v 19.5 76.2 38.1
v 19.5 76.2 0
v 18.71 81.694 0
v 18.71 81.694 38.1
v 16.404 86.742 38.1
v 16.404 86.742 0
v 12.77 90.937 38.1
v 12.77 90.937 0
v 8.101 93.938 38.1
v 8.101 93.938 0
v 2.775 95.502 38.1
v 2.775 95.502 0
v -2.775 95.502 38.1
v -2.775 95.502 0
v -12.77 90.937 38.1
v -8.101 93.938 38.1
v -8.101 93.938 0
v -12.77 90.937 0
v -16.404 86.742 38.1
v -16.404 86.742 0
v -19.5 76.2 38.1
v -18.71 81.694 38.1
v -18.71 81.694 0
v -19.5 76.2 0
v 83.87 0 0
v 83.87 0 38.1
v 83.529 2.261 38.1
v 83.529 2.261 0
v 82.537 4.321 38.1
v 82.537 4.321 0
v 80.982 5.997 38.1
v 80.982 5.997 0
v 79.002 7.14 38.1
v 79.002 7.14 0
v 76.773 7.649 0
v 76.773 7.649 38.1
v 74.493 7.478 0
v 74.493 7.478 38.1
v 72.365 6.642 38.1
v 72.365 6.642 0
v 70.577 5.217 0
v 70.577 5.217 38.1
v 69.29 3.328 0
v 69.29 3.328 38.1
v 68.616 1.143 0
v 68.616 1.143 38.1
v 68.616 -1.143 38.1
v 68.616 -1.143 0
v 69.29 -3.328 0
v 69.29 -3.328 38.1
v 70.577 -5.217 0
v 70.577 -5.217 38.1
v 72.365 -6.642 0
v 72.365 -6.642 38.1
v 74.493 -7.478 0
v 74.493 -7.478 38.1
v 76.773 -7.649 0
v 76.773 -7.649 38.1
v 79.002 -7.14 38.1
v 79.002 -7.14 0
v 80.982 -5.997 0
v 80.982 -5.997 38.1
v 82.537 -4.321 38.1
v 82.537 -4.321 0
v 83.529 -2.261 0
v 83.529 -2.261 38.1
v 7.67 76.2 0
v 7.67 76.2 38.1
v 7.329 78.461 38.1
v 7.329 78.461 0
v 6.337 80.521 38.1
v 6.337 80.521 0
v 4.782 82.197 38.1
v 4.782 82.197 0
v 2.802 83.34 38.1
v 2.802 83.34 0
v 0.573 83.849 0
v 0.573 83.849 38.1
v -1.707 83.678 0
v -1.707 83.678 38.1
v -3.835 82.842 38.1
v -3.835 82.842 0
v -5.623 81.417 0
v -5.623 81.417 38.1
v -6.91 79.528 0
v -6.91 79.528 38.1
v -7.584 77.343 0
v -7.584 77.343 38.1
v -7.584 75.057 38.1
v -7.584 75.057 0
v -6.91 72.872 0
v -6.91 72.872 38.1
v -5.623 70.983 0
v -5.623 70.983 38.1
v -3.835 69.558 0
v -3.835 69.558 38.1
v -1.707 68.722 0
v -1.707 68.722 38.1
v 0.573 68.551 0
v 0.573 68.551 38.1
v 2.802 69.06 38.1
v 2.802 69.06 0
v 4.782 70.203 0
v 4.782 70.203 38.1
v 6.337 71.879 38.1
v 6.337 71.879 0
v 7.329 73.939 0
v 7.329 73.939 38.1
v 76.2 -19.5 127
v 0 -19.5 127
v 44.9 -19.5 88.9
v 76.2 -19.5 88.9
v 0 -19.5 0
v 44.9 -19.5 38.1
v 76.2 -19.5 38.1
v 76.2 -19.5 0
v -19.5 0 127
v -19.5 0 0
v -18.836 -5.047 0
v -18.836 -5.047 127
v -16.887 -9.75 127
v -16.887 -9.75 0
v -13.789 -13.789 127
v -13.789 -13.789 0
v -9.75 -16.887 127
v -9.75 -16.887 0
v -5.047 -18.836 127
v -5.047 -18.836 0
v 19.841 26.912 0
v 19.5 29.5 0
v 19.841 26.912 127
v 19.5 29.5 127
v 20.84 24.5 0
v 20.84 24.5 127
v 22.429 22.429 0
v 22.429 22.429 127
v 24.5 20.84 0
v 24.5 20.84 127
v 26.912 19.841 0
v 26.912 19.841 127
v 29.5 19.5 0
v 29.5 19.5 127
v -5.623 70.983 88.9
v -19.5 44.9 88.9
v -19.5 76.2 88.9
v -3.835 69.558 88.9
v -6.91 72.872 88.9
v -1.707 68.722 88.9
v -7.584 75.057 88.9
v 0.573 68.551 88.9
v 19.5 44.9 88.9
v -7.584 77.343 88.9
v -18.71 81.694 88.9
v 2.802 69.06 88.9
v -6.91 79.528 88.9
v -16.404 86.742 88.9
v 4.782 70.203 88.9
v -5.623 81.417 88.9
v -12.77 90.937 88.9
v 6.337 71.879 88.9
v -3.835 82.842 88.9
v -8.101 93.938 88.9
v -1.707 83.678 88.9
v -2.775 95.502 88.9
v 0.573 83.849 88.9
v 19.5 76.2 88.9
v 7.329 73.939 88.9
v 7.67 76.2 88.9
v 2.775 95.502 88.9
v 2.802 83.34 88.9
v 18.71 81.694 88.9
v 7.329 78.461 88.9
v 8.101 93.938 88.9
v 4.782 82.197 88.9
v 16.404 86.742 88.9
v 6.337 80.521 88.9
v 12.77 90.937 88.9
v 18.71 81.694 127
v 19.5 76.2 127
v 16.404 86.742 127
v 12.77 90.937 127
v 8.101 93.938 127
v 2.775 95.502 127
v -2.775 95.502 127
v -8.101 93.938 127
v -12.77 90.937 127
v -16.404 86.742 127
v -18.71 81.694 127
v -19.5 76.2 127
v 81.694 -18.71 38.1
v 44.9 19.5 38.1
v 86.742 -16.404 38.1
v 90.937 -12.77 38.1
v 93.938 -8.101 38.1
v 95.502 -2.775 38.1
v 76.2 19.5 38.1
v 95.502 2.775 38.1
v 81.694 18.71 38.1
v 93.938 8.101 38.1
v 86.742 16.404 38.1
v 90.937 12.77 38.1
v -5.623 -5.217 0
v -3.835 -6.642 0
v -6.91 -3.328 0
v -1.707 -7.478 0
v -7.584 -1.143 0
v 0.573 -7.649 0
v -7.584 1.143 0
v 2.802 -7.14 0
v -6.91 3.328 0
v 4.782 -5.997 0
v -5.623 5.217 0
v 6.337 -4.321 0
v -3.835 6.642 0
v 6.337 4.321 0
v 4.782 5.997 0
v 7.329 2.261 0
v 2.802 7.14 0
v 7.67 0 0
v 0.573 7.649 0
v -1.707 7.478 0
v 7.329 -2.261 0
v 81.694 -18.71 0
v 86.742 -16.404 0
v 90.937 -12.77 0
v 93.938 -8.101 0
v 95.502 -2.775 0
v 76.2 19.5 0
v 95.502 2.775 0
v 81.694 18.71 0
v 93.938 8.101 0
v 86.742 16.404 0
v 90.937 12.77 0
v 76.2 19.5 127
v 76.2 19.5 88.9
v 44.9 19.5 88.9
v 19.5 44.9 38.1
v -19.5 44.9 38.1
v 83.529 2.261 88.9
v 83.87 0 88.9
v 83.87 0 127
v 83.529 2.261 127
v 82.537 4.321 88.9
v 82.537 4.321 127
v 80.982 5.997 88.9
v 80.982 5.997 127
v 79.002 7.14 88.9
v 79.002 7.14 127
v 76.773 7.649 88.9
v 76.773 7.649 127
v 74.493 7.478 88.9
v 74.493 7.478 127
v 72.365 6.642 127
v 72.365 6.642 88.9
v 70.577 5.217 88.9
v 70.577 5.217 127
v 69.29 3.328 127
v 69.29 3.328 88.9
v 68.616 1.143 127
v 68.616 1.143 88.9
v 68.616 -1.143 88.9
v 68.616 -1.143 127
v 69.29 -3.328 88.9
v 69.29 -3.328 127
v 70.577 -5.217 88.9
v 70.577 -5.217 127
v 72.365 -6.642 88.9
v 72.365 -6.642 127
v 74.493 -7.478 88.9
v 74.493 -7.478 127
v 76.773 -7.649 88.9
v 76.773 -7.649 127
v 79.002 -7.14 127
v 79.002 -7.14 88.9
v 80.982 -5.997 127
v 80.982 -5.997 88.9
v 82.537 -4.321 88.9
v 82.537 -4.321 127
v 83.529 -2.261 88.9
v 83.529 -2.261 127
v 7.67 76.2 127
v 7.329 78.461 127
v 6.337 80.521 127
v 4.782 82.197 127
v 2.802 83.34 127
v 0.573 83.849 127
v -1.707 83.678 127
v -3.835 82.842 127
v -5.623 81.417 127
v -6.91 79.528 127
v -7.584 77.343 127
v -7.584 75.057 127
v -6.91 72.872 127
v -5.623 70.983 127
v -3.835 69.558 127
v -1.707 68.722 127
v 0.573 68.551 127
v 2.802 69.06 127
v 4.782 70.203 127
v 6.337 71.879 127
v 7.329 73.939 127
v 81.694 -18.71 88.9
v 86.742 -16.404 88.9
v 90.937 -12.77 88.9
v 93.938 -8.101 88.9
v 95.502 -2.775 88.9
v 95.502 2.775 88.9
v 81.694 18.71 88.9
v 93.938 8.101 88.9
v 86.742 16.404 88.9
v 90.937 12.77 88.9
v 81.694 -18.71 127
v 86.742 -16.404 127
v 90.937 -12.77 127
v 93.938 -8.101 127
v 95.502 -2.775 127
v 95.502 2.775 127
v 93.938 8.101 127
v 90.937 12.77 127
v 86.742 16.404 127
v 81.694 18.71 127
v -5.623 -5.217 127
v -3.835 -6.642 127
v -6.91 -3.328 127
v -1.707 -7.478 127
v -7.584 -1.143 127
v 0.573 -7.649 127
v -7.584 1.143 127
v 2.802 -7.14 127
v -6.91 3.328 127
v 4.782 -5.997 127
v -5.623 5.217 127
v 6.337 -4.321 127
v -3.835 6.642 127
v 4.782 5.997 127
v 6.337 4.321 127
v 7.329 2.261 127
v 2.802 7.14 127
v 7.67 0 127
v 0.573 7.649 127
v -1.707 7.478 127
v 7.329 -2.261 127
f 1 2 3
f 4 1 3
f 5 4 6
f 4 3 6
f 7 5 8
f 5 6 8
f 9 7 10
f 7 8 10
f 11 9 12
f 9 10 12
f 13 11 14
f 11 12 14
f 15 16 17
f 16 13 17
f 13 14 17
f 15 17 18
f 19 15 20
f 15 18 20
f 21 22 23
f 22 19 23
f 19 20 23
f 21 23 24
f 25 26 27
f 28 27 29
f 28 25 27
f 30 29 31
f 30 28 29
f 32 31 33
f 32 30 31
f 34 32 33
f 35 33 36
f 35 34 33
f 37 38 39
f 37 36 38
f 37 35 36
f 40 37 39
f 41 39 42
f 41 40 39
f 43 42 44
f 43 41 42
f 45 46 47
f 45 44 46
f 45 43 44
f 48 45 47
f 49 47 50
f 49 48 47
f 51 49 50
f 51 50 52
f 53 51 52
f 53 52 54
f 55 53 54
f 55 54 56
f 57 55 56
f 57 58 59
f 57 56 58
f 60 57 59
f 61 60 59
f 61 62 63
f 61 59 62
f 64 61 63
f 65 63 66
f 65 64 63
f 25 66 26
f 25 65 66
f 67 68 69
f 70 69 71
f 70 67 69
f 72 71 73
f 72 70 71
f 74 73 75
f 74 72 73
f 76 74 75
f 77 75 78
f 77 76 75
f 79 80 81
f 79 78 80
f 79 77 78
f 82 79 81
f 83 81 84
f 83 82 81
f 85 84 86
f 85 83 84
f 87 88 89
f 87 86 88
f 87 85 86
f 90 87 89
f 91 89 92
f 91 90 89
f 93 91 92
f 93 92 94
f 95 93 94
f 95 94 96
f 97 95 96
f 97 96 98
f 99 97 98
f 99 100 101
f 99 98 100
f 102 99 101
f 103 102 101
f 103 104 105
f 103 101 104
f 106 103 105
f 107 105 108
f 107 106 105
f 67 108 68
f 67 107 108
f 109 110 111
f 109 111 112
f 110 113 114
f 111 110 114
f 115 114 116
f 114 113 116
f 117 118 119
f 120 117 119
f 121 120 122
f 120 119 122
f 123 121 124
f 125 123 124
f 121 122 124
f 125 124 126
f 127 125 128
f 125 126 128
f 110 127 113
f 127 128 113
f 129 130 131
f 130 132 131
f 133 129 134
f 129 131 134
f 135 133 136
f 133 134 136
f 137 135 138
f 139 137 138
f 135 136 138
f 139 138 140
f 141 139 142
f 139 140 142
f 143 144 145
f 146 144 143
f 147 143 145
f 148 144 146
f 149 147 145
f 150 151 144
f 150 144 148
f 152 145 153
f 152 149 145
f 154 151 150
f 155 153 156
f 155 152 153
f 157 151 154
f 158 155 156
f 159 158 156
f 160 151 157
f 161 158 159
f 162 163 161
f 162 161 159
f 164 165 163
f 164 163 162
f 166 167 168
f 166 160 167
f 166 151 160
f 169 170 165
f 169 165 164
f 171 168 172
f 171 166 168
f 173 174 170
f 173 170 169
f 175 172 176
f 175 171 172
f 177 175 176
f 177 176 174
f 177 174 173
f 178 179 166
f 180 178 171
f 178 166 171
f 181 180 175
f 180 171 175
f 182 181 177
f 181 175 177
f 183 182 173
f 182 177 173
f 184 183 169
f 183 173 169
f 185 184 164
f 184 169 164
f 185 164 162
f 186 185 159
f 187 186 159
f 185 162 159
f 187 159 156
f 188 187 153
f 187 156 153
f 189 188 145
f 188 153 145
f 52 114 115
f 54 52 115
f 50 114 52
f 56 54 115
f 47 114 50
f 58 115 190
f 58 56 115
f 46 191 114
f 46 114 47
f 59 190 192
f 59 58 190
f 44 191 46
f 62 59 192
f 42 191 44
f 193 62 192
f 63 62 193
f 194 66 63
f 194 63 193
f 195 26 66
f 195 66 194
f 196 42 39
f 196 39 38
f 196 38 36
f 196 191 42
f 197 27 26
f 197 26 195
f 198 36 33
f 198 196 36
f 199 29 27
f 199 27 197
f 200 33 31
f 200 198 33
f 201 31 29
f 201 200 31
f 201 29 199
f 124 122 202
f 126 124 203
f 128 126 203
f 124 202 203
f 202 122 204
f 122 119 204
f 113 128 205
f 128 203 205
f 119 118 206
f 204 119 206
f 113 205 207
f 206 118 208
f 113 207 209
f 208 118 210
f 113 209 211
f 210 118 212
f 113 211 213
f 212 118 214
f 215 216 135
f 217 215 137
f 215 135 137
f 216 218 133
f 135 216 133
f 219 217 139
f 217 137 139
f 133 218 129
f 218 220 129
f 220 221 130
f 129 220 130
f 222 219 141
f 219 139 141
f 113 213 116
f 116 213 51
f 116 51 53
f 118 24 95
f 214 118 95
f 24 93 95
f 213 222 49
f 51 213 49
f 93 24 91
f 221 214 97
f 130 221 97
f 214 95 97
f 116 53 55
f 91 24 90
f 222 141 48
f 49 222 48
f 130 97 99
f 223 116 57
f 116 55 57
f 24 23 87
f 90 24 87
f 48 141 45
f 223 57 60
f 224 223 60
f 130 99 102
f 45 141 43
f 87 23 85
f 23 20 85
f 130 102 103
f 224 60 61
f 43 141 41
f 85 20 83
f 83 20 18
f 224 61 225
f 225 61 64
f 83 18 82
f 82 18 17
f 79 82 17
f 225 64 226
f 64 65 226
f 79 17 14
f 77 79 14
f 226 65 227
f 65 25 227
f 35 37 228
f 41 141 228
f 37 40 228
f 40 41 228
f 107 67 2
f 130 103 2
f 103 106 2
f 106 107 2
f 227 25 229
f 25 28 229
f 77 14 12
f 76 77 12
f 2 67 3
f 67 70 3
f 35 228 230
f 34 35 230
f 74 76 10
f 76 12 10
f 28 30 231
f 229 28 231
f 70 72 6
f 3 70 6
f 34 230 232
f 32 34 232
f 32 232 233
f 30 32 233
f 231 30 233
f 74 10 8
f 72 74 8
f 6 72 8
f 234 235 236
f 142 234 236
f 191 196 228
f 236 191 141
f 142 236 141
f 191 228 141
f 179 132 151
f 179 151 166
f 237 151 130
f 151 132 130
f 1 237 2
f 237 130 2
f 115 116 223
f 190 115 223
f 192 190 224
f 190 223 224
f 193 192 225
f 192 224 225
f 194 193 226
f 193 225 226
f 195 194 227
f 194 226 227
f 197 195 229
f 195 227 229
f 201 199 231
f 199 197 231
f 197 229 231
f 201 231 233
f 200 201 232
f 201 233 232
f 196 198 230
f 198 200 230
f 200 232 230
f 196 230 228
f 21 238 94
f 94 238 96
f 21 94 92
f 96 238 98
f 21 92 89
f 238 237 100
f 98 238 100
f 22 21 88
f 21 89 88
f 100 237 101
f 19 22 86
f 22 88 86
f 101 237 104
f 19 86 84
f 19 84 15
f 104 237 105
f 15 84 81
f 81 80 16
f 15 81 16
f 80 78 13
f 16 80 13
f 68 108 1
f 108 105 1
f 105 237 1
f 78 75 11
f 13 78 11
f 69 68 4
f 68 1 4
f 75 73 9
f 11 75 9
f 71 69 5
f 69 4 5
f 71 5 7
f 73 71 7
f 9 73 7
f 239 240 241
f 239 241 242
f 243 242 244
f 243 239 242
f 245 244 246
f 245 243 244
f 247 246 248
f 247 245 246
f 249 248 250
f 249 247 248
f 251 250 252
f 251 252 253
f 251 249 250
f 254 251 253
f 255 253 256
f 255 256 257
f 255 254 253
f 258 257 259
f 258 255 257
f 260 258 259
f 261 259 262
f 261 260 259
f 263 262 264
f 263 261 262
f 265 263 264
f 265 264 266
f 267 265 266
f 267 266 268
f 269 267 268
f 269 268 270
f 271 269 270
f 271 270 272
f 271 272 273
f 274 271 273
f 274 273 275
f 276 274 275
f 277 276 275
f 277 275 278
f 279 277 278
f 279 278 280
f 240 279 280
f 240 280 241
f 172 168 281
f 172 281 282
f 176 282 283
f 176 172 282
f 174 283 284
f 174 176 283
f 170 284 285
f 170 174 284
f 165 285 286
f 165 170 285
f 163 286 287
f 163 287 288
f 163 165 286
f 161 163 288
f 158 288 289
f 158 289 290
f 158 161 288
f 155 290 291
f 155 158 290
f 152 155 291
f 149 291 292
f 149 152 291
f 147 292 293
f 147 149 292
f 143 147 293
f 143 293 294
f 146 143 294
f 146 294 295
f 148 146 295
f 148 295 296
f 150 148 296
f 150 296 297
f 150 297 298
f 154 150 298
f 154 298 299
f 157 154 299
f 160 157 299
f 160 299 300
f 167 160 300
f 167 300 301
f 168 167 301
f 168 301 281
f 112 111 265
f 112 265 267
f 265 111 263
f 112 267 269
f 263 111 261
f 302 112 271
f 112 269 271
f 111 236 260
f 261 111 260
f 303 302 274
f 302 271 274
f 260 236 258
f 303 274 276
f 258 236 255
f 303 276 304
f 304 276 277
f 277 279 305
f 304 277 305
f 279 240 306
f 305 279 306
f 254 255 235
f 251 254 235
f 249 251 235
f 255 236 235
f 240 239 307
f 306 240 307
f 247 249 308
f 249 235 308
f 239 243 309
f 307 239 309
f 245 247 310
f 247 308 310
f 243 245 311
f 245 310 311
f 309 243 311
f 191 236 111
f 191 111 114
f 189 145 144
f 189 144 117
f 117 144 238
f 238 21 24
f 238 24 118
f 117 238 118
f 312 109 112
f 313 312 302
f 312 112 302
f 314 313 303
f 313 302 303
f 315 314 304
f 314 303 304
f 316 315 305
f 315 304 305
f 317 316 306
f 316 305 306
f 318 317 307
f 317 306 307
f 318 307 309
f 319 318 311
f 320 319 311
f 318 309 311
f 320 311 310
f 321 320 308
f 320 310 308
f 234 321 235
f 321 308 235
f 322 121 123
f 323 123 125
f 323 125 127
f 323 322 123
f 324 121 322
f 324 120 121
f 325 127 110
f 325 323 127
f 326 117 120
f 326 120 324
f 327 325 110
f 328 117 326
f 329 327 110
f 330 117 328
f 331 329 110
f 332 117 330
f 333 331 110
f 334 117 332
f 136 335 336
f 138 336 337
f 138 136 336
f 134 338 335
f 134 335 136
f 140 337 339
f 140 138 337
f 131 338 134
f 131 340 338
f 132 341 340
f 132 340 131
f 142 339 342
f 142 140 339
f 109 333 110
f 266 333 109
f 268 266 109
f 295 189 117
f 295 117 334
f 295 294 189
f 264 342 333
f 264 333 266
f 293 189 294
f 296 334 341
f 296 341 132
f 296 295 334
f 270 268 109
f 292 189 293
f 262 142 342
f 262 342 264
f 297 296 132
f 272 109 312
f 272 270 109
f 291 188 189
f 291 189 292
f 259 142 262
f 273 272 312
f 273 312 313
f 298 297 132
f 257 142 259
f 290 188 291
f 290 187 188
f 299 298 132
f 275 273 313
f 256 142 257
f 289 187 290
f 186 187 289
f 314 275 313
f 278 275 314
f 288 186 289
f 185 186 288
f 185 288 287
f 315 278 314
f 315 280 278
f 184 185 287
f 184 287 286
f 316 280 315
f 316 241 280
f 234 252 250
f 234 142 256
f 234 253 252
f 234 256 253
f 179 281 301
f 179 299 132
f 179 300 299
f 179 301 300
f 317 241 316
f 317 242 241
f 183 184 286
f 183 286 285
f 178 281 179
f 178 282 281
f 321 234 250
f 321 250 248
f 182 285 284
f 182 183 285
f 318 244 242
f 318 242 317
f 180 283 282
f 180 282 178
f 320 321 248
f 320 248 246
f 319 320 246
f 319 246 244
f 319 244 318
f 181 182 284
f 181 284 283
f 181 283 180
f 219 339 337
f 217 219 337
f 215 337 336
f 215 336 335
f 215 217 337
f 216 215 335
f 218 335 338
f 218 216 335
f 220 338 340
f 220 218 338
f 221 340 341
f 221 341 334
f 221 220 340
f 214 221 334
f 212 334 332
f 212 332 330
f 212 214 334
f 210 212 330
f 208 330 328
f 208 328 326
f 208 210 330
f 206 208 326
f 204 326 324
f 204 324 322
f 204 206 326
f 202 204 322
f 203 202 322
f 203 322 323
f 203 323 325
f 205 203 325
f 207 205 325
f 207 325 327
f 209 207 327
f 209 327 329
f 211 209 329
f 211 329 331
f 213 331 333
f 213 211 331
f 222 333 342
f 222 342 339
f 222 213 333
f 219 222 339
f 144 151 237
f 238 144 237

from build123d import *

# Parameters (mm, degrees)
SKETCH1_R           = 7.67
BOSS_EXTRUDE1_DEPTH = 127
FILLET1_R           = 10
SKETCH2_W           = 50.8
SKETCH2_H           = 70.745219222
CUT_EXTRUDE1_DEPTH  = 186.59628229


with BuildPart() as part:
    # Sketch1 → Boss-Extrude1 (new body)
    with BuildSketch(Plane.XY):
        with BuildLine():
            Line((-19.5, 76.2), (-19.5, 0))
            ThreePointArc((-19.5, 0), (-13.788582233, -13.788582233), (0, -19.5))
            Line((0, -19.5), (76.2, -19.5))
            ThreePointArc((76.2, -19.5), (95.7, 0), (76.2, 19.5))
            Line((76.2, 19.5), (19.5, 19.5))
            Line((19.5, 19.5), (19.5, 76.2))
            ThreePointArc((19.5, 76.2), (0, 95.7), (-19.5, 76.2))
        make_face()
        Circle(SKETCH1_R, mode=Mode.SUBTRACT)
        with Locations((0, 76.2)):
            Circle(SKETCH1_R, mode=Mode.SUBTRACT)
        with Locations((76.2, 0)):
            Circle(SKETCH1_R, mode=Mode.SUBTRACT)
    extrude(amount=BOSS_EXTRUDE1_DEPTH)

    # Fillet1
    fillet1_edges = [part.edges().sort_by_distance(p)[0] for p in [
        (19.5, 19.5, 63.5),
    ]]
    fillet(fillet1_edges, radius=FILLET1_R)

    # Sketch2 → Cut-Extrude1 (cut, symmetric)
    with BuildSketch(Plane(origin=(0, 0, 0), x_dir=(0, 0, -1), z_dir=(1, 0, 0))):
        with Locations((-63.5, 80.272609611)):
            Rectangle(SKETCH2_W, SKETCH2_H)
    cut_extrude1 = extrude(amount=CUT_EXTRUDE1_DEPTH, both=True, mode=Mode.SUBTRACT)

    # Mirror1: Cut-Extrude1 across plane
    add(cut_extrude1.mirror(Plane(origin=(0, 0, 0), x_dir=(0, 0, 1), z_dir=(-0.7071067811865512, 0.7071067811865438, 0))), mode=Mode.SUBTRACT)


solid = part.part
